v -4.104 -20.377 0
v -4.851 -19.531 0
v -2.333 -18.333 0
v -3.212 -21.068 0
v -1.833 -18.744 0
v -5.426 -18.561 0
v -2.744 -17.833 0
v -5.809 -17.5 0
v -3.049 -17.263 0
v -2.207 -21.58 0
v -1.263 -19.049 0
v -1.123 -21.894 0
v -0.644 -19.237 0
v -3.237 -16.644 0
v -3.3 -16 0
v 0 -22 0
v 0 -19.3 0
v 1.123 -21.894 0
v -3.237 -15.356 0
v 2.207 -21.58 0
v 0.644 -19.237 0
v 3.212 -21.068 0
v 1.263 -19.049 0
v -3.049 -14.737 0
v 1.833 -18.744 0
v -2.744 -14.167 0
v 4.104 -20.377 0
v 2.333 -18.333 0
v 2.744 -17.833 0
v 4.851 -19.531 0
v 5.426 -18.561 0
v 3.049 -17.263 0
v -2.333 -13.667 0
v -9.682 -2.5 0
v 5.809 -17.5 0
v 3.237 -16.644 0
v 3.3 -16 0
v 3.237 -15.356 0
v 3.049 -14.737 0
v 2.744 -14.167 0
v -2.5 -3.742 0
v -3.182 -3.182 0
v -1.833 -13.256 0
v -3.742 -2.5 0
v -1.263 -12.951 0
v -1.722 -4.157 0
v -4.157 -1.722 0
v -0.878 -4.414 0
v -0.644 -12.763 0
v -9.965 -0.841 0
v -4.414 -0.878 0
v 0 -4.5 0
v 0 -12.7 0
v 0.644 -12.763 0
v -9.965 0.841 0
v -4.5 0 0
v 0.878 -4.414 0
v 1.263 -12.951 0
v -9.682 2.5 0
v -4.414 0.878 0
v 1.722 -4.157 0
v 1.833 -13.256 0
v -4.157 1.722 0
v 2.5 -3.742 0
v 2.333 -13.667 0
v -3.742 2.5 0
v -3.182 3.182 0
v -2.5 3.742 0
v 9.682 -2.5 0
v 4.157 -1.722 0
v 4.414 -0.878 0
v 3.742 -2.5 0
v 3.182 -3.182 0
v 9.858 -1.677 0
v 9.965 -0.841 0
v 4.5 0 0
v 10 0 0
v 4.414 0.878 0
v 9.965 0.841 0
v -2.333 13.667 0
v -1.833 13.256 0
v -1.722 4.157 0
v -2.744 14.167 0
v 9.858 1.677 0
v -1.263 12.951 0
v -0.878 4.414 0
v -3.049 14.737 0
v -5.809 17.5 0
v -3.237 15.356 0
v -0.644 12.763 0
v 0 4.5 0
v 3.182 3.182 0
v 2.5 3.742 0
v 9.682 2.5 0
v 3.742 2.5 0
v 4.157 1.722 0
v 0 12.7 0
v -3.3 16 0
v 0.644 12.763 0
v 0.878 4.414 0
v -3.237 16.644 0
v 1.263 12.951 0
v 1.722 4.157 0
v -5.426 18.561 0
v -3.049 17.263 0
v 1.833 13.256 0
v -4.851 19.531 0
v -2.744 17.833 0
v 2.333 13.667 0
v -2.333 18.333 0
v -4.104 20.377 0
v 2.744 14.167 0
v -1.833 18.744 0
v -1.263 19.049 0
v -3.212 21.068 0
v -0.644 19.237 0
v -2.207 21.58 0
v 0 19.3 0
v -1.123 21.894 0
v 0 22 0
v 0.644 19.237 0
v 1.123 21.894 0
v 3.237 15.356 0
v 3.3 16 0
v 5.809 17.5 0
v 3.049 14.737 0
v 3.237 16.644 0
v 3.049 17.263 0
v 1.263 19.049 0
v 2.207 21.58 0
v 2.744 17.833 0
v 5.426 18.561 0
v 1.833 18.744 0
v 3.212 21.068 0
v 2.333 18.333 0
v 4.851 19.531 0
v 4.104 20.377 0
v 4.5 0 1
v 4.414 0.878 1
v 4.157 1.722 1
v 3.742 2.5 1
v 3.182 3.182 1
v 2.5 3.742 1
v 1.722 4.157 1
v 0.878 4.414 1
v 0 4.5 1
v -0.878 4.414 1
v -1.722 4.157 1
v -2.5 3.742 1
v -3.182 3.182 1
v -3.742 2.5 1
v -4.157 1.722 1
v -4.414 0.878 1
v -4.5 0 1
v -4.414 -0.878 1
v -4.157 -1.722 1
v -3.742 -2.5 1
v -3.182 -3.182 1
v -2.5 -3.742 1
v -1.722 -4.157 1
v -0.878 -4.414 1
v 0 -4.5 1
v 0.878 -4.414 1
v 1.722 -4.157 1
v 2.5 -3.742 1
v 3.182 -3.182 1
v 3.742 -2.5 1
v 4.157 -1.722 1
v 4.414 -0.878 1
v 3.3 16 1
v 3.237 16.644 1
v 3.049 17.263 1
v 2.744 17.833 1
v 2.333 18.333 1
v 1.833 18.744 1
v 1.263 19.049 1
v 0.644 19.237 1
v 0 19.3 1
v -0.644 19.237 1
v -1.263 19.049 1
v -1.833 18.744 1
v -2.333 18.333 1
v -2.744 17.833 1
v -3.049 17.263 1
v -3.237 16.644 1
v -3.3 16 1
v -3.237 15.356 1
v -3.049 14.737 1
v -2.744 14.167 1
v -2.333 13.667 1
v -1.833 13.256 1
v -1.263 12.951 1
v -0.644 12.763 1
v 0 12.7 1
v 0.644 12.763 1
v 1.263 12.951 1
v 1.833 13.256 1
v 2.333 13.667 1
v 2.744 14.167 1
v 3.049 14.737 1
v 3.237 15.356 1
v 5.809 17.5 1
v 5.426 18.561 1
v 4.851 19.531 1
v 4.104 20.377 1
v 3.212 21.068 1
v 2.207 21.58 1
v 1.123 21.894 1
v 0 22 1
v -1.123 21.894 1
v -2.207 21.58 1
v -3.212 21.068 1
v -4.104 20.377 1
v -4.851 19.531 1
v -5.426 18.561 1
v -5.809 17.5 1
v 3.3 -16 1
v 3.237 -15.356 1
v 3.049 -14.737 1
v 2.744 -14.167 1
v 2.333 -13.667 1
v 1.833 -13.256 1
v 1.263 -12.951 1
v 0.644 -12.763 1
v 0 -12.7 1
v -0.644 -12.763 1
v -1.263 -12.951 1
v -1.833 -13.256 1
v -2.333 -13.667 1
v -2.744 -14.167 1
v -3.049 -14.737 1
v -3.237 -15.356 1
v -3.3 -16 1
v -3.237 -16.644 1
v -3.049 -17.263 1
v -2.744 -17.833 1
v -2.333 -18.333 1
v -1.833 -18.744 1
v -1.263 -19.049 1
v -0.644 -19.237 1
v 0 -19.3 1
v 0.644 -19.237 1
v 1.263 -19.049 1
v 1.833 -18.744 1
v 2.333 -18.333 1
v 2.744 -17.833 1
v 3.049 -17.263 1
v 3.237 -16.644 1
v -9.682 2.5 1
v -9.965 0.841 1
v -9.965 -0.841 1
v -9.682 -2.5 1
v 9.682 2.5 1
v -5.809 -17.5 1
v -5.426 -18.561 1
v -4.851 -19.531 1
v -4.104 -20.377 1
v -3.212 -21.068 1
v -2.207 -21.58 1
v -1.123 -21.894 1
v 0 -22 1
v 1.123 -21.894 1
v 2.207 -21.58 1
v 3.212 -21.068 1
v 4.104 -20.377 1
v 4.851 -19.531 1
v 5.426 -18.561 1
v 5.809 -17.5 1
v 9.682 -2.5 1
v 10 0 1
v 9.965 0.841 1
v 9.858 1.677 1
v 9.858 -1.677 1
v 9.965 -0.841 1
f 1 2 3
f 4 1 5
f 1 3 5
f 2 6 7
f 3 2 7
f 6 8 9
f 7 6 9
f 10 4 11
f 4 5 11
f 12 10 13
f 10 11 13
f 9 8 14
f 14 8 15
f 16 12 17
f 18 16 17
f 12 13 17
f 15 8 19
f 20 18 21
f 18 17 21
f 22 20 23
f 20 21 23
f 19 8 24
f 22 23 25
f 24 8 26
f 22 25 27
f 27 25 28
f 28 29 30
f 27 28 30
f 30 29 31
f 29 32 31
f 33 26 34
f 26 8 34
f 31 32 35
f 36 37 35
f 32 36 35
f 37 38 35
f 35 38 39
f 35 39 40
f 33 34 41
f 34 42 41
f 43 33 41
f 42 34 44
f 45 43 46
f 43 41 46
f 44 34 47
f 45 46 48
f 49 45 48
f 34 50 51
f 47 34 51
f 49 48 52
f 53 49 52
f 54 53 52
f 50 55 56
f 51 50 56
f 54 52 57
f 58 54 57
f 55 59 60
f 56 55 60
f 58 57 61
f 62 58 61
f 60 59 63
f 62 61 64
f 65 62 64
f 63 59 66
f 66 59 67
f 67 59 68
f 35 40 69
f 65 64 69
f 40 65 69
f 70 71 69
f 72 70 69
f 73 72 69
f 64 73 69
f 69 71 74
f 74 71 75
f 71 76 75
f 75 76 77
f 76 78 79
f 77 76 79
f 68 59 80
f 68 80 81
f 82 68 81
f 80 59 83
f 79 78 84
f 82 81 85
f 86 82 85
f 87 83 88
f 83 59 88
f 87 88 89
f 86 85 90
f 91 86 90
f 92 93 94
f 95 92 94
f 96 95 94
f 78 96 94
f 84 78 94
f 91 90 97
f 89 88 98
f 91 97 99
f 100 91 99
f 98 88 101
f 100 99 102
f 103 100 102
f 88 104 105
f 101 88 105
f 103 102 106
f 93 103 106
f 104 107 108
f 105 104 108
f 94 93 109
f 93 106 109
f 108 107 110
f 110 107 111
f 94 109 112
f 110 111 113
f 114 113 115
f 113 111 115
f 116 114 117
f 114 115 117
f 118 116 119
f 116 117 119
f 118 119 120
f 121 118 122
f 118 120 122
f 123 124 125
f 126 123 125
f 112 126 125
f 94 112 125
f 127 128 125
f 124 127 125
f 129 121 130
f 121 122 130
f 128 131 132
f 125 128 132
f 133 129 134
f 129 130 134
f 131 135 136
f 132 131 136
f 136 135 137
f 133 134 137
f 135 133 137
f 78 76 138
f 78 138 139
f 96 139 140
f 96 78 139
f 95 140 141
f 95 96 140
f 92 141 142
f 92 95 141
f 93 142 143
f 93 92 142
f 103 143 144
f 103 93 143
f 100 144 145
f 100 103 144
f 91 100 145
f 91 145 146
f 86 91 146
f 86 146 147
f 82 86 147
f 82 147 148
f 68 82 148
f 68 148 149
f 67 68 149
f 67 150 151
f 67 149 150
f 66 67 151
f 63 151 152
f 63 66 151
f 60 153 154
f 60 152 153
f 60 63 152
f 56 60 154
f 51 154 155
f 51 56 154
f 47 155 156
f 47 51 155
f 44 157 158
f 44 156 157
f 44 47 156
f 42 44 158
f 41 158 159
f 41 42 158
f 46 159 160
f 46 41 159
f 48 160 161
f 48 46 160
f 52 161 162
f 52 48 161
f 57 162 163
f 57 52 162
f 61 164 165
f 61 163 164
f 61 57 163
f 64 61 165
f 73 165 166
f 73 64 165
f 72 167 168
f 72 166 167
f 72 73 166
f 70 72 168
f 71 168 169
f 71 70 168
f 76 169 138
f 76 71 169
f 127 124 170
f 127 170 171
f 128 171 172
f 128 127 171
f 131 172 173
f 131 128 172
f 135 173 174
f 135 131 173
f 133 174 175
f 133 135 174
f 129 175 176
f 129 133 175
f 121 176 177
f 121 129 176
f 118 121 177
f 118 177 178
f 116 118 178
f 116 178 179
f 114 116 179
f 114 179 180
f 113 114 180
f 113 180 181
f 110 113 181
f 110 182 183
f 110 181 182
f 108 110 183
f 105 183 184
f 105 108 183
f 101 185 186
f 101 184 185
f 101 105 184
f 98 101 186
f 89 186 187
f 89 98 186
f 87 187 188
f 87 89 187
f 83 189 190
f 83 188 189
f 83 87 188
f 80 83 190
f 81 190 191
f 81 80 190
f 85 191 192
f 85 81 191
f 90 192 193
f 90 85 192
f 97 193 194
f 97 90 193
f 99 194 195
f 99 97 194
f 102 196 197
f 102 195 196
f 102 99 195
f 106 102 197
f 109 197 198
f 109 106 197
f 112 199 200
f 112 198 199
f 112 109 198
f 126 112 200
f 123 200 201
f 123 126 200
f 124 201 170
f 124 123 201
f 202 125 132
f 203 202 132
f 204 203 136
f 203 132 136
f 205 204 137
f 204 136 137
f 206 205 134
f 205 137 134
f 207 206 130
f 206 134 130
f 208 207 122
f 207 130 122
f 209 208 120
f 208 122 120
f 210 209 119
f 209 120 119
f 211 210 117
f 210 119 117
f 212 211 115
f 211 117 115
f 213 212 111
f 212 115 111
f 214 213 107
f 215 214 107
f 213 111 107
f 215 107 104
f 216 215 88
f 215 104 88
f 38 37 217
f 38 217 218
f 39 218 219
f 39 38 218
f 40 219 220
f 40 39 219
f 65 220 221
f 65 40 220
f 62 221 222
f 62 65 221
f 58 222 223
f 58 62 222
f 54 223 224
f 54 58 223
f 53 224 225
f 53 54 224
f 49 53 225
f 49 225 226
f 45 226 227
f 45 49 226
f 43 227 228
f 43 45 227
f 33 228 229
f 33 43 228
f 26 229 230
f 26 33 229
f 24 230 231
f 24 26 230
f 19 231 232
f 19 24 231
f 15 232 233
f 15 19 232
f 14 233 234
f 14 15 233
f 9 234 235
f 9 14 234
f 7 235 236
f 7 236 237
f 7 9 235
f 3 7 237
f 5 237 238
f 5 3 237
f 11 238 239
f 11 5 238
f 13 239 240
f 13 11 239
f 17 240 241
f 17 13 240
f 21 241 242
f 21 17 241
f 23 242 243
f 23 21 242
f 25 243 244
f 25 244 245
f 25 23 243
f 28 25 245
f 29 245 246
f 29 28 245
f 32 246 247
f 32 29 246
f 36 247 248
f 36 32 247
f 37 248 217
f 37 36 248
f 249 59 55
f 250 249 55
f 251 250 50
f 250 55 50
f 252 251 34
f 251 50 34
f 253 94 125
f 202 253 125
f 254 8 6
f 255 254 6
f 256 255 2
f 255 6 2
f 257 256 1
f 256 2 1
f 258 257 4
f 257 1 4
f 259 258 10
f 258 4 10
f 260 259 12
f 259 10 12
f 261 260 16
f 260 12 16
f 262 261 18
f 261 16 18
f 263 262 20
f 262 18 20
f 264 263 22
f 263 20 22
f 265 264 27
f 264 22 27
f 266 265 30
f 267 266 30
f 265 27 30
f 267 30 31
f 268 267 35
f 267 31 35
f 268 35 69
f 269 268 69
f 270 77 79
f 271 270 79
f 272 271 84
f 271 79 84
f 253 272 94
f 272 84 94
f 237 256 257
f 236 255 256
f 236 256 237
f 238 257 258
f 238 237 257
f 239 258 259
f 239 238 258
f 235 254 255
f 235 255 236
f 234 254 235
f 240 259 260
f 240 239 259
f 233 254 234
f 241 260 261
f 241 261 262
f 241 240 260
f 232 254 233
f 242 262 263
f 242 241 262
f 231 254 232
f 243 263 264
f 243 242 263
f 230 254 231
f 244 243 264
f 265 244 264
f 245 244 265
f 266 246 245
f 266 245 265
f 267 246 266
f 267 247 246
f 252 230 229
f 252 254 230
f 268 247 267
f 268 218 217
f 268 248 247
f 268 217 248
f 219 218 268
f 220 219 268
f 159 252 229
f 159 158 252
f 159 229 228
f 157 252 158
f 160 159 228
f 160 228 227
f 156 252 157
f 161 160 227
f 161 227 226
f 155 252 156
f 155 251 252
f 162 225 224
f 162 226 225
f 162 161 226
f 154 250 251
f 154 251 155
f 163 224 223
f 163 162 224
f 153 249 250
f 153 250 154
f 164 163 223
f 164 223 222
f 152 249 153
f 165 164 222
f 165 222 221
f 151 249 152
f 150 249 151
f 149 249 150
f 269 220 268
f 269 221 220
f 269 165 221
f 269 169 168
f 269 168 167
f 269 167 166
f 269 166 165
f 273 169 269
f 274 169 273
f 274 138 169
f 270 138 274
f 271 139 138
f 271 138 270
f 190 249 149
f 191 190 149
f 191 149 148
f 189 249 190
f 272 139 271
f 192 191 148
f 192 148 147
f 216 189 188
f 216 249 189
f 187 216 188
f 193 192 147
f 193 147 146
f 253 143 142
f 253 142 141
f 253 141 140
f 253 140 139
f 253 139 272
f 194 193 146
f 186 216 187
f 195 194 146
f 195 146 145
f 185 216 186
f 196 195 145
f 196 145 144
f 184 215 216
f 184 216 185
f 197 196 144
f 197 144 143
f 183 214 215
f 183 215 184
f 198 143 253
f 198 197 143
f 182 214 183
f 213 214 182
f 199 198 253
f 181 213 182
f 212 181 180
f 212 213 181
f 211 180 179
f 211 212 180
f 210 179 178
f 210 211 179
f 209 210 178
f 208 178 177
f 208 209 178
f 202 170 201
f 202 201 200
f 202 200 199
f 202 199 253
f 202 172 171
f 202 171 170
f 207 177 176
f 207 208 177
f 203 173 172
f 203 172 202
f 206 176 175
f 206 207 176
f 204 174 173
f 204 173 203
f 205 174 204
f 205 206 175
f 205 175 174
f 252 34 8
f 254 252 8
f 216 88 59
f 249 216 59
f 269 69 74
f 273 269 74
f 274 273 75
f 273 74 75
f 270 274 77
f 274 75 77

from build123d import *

# Parameters (mm, degrees)
F0_R     = 3.3
F0_R_2   = 4.5
F1_DEPTH = 1
F2_D     = 6.6
F3_D     = 6.6
F4_D     = 9


with BuildPart() as f1:
    # F0 (on Top) → F1 (new body)
    with BuildSketch(Plane.XY):
        with Locations((0, 16)):
            Circle(F0_R)
        Circle(F0_R_2)
        with Locations((0, -16)):
            Circle(F0_R)
        with BuildLine():
            ThreePointArc((0, 10), (6.123724, 7.905694), (9.682458, 2.5))
            Line((9.682458, 2.5), (5.809475, 17.5))
            ThreePointArc((5.809475, 17.5), (5.952178, 16.756026), (6, 16))
            ThreePointArc((6, 16), (4.242641, 11.757359), (0, 10))
        make_face()
        with BuildLine():
            ThreePointArc((-9.682458, 2.5), (-6.123724, 7.905694), (0, 10))
            ThreePointArc((0, 10), (-4.743416, 12.325765), (-5.809475, 17.5))
            Line((-5.809475, 17.5), (-9.682458, 2.5))
        make_face()
        with BuildLine():
            Line((5.809475, -17.5), (9.682458, -2.5))
            ThreePointArc((9.682458, -2.5), (6.123724, -7.905694), (0, -10))
            ThreePointArc((0, -10), (4.242641, -11.757359), (6, -16))
            ThreePointArc((6, -16), (5.952178, -16.756026), (5.809475, -17.5))
        make_face()
        with BuildLine():
            ThreePointArc((-5.809475, -17.5), (-4.743416, -12.325765), (0, -10))
            ThreePointArc((0, -10), (-6.123724, -7.905694), (-9.682458, -2.5))
            Line((-9.682458, -2.5), (-5.809475, -17.5))
        make_face()
        with BuildLine():
            ThreePointArc((6, -16), (4.242641, -11.757359), (0, -10))
            ThreePointArc((0, -10), (-4.743416, -12.325765), (-5.809475, -17.5))
            ThreePointArc((-5.809475, -17.5), (0, -22), (5.809475, -17.5))
            ThreePointArc((5.809475, -17.5), (5.952178, -16.756026), (6, -16))
        make_face()
        with Locations((0, -16)):
            Circle(F0_R, mode=Mode.SUBTRACT)
        with BuildLine():
            ThreePointArc((-5.809475, 17.5), (-4.743416, 12.325765), (0, 10))
            ThreePointArc((0, 10), (4.242641, 11.757359), (6, 16))
            ThreePointArc((6, 16), (5.952178, 16.756026), (5.809475, 17.5))
            ThreePointArc((5.809475, 17.5), (0, 22), (-5.809475, 17.5))
        make_face()
        with Locations((0, 16)):
            Circle(F0_R, mode=Mode.SUBTRACT)
        with BuildLine():
            ThreePointArc((9.682458, -2.5), (9.920297, -1.260043), (10, 0))
            ThreePointArc((10, 0), (9.920297, 1.260043), (9.682458, 2.5))
            ThreePointArc((9.682458, 2.5), (6.123724, 7.905694), (0, 10))
            ThreePointArc((0, 10), (-6.123724, 7.905694), (-9.682458, 2.5))
            ThreePointArc((-9.682458, 2.5), (-10, 0), (-9.682458, -2.5))
            ThreePointArc((-9.682458, -2.5), (-6.123724, -7.905694), (0, -10))
            ThreePointArc((0, -10), (6.123724, -7.905694), (9.682458, -2.5))
        make_face()
        Circle(F0_R_2, mode=Mode.SUBTRACT)
    extrude(amount=F1_DEPTH)

    # F2 (through all)
    with Locations(Plane(origin=(0, 0, 0), x_dir=(1, 0, 0), z_dir=(0, 0, -1))):
        with Locations((0, 16)):
            Hole(F2_D / 2)

    # F3 (through all)
    with Locations(Plane(origin=(0, 0, 0), x_dir=(1, 0, 0), z_dir=(0, 0, -1))):
        with Locations((0, -16)):
            Hole(F3_D / 2)

    # F4 (through all)
    with Locations(Plane(origin=(0, 0, 0), x_dir=(1, 0, 0), z_dir=(0, 0, -1))):
        with Locations((0, 0)):
            Hole(F4_D / 2)


solid = f1.part
